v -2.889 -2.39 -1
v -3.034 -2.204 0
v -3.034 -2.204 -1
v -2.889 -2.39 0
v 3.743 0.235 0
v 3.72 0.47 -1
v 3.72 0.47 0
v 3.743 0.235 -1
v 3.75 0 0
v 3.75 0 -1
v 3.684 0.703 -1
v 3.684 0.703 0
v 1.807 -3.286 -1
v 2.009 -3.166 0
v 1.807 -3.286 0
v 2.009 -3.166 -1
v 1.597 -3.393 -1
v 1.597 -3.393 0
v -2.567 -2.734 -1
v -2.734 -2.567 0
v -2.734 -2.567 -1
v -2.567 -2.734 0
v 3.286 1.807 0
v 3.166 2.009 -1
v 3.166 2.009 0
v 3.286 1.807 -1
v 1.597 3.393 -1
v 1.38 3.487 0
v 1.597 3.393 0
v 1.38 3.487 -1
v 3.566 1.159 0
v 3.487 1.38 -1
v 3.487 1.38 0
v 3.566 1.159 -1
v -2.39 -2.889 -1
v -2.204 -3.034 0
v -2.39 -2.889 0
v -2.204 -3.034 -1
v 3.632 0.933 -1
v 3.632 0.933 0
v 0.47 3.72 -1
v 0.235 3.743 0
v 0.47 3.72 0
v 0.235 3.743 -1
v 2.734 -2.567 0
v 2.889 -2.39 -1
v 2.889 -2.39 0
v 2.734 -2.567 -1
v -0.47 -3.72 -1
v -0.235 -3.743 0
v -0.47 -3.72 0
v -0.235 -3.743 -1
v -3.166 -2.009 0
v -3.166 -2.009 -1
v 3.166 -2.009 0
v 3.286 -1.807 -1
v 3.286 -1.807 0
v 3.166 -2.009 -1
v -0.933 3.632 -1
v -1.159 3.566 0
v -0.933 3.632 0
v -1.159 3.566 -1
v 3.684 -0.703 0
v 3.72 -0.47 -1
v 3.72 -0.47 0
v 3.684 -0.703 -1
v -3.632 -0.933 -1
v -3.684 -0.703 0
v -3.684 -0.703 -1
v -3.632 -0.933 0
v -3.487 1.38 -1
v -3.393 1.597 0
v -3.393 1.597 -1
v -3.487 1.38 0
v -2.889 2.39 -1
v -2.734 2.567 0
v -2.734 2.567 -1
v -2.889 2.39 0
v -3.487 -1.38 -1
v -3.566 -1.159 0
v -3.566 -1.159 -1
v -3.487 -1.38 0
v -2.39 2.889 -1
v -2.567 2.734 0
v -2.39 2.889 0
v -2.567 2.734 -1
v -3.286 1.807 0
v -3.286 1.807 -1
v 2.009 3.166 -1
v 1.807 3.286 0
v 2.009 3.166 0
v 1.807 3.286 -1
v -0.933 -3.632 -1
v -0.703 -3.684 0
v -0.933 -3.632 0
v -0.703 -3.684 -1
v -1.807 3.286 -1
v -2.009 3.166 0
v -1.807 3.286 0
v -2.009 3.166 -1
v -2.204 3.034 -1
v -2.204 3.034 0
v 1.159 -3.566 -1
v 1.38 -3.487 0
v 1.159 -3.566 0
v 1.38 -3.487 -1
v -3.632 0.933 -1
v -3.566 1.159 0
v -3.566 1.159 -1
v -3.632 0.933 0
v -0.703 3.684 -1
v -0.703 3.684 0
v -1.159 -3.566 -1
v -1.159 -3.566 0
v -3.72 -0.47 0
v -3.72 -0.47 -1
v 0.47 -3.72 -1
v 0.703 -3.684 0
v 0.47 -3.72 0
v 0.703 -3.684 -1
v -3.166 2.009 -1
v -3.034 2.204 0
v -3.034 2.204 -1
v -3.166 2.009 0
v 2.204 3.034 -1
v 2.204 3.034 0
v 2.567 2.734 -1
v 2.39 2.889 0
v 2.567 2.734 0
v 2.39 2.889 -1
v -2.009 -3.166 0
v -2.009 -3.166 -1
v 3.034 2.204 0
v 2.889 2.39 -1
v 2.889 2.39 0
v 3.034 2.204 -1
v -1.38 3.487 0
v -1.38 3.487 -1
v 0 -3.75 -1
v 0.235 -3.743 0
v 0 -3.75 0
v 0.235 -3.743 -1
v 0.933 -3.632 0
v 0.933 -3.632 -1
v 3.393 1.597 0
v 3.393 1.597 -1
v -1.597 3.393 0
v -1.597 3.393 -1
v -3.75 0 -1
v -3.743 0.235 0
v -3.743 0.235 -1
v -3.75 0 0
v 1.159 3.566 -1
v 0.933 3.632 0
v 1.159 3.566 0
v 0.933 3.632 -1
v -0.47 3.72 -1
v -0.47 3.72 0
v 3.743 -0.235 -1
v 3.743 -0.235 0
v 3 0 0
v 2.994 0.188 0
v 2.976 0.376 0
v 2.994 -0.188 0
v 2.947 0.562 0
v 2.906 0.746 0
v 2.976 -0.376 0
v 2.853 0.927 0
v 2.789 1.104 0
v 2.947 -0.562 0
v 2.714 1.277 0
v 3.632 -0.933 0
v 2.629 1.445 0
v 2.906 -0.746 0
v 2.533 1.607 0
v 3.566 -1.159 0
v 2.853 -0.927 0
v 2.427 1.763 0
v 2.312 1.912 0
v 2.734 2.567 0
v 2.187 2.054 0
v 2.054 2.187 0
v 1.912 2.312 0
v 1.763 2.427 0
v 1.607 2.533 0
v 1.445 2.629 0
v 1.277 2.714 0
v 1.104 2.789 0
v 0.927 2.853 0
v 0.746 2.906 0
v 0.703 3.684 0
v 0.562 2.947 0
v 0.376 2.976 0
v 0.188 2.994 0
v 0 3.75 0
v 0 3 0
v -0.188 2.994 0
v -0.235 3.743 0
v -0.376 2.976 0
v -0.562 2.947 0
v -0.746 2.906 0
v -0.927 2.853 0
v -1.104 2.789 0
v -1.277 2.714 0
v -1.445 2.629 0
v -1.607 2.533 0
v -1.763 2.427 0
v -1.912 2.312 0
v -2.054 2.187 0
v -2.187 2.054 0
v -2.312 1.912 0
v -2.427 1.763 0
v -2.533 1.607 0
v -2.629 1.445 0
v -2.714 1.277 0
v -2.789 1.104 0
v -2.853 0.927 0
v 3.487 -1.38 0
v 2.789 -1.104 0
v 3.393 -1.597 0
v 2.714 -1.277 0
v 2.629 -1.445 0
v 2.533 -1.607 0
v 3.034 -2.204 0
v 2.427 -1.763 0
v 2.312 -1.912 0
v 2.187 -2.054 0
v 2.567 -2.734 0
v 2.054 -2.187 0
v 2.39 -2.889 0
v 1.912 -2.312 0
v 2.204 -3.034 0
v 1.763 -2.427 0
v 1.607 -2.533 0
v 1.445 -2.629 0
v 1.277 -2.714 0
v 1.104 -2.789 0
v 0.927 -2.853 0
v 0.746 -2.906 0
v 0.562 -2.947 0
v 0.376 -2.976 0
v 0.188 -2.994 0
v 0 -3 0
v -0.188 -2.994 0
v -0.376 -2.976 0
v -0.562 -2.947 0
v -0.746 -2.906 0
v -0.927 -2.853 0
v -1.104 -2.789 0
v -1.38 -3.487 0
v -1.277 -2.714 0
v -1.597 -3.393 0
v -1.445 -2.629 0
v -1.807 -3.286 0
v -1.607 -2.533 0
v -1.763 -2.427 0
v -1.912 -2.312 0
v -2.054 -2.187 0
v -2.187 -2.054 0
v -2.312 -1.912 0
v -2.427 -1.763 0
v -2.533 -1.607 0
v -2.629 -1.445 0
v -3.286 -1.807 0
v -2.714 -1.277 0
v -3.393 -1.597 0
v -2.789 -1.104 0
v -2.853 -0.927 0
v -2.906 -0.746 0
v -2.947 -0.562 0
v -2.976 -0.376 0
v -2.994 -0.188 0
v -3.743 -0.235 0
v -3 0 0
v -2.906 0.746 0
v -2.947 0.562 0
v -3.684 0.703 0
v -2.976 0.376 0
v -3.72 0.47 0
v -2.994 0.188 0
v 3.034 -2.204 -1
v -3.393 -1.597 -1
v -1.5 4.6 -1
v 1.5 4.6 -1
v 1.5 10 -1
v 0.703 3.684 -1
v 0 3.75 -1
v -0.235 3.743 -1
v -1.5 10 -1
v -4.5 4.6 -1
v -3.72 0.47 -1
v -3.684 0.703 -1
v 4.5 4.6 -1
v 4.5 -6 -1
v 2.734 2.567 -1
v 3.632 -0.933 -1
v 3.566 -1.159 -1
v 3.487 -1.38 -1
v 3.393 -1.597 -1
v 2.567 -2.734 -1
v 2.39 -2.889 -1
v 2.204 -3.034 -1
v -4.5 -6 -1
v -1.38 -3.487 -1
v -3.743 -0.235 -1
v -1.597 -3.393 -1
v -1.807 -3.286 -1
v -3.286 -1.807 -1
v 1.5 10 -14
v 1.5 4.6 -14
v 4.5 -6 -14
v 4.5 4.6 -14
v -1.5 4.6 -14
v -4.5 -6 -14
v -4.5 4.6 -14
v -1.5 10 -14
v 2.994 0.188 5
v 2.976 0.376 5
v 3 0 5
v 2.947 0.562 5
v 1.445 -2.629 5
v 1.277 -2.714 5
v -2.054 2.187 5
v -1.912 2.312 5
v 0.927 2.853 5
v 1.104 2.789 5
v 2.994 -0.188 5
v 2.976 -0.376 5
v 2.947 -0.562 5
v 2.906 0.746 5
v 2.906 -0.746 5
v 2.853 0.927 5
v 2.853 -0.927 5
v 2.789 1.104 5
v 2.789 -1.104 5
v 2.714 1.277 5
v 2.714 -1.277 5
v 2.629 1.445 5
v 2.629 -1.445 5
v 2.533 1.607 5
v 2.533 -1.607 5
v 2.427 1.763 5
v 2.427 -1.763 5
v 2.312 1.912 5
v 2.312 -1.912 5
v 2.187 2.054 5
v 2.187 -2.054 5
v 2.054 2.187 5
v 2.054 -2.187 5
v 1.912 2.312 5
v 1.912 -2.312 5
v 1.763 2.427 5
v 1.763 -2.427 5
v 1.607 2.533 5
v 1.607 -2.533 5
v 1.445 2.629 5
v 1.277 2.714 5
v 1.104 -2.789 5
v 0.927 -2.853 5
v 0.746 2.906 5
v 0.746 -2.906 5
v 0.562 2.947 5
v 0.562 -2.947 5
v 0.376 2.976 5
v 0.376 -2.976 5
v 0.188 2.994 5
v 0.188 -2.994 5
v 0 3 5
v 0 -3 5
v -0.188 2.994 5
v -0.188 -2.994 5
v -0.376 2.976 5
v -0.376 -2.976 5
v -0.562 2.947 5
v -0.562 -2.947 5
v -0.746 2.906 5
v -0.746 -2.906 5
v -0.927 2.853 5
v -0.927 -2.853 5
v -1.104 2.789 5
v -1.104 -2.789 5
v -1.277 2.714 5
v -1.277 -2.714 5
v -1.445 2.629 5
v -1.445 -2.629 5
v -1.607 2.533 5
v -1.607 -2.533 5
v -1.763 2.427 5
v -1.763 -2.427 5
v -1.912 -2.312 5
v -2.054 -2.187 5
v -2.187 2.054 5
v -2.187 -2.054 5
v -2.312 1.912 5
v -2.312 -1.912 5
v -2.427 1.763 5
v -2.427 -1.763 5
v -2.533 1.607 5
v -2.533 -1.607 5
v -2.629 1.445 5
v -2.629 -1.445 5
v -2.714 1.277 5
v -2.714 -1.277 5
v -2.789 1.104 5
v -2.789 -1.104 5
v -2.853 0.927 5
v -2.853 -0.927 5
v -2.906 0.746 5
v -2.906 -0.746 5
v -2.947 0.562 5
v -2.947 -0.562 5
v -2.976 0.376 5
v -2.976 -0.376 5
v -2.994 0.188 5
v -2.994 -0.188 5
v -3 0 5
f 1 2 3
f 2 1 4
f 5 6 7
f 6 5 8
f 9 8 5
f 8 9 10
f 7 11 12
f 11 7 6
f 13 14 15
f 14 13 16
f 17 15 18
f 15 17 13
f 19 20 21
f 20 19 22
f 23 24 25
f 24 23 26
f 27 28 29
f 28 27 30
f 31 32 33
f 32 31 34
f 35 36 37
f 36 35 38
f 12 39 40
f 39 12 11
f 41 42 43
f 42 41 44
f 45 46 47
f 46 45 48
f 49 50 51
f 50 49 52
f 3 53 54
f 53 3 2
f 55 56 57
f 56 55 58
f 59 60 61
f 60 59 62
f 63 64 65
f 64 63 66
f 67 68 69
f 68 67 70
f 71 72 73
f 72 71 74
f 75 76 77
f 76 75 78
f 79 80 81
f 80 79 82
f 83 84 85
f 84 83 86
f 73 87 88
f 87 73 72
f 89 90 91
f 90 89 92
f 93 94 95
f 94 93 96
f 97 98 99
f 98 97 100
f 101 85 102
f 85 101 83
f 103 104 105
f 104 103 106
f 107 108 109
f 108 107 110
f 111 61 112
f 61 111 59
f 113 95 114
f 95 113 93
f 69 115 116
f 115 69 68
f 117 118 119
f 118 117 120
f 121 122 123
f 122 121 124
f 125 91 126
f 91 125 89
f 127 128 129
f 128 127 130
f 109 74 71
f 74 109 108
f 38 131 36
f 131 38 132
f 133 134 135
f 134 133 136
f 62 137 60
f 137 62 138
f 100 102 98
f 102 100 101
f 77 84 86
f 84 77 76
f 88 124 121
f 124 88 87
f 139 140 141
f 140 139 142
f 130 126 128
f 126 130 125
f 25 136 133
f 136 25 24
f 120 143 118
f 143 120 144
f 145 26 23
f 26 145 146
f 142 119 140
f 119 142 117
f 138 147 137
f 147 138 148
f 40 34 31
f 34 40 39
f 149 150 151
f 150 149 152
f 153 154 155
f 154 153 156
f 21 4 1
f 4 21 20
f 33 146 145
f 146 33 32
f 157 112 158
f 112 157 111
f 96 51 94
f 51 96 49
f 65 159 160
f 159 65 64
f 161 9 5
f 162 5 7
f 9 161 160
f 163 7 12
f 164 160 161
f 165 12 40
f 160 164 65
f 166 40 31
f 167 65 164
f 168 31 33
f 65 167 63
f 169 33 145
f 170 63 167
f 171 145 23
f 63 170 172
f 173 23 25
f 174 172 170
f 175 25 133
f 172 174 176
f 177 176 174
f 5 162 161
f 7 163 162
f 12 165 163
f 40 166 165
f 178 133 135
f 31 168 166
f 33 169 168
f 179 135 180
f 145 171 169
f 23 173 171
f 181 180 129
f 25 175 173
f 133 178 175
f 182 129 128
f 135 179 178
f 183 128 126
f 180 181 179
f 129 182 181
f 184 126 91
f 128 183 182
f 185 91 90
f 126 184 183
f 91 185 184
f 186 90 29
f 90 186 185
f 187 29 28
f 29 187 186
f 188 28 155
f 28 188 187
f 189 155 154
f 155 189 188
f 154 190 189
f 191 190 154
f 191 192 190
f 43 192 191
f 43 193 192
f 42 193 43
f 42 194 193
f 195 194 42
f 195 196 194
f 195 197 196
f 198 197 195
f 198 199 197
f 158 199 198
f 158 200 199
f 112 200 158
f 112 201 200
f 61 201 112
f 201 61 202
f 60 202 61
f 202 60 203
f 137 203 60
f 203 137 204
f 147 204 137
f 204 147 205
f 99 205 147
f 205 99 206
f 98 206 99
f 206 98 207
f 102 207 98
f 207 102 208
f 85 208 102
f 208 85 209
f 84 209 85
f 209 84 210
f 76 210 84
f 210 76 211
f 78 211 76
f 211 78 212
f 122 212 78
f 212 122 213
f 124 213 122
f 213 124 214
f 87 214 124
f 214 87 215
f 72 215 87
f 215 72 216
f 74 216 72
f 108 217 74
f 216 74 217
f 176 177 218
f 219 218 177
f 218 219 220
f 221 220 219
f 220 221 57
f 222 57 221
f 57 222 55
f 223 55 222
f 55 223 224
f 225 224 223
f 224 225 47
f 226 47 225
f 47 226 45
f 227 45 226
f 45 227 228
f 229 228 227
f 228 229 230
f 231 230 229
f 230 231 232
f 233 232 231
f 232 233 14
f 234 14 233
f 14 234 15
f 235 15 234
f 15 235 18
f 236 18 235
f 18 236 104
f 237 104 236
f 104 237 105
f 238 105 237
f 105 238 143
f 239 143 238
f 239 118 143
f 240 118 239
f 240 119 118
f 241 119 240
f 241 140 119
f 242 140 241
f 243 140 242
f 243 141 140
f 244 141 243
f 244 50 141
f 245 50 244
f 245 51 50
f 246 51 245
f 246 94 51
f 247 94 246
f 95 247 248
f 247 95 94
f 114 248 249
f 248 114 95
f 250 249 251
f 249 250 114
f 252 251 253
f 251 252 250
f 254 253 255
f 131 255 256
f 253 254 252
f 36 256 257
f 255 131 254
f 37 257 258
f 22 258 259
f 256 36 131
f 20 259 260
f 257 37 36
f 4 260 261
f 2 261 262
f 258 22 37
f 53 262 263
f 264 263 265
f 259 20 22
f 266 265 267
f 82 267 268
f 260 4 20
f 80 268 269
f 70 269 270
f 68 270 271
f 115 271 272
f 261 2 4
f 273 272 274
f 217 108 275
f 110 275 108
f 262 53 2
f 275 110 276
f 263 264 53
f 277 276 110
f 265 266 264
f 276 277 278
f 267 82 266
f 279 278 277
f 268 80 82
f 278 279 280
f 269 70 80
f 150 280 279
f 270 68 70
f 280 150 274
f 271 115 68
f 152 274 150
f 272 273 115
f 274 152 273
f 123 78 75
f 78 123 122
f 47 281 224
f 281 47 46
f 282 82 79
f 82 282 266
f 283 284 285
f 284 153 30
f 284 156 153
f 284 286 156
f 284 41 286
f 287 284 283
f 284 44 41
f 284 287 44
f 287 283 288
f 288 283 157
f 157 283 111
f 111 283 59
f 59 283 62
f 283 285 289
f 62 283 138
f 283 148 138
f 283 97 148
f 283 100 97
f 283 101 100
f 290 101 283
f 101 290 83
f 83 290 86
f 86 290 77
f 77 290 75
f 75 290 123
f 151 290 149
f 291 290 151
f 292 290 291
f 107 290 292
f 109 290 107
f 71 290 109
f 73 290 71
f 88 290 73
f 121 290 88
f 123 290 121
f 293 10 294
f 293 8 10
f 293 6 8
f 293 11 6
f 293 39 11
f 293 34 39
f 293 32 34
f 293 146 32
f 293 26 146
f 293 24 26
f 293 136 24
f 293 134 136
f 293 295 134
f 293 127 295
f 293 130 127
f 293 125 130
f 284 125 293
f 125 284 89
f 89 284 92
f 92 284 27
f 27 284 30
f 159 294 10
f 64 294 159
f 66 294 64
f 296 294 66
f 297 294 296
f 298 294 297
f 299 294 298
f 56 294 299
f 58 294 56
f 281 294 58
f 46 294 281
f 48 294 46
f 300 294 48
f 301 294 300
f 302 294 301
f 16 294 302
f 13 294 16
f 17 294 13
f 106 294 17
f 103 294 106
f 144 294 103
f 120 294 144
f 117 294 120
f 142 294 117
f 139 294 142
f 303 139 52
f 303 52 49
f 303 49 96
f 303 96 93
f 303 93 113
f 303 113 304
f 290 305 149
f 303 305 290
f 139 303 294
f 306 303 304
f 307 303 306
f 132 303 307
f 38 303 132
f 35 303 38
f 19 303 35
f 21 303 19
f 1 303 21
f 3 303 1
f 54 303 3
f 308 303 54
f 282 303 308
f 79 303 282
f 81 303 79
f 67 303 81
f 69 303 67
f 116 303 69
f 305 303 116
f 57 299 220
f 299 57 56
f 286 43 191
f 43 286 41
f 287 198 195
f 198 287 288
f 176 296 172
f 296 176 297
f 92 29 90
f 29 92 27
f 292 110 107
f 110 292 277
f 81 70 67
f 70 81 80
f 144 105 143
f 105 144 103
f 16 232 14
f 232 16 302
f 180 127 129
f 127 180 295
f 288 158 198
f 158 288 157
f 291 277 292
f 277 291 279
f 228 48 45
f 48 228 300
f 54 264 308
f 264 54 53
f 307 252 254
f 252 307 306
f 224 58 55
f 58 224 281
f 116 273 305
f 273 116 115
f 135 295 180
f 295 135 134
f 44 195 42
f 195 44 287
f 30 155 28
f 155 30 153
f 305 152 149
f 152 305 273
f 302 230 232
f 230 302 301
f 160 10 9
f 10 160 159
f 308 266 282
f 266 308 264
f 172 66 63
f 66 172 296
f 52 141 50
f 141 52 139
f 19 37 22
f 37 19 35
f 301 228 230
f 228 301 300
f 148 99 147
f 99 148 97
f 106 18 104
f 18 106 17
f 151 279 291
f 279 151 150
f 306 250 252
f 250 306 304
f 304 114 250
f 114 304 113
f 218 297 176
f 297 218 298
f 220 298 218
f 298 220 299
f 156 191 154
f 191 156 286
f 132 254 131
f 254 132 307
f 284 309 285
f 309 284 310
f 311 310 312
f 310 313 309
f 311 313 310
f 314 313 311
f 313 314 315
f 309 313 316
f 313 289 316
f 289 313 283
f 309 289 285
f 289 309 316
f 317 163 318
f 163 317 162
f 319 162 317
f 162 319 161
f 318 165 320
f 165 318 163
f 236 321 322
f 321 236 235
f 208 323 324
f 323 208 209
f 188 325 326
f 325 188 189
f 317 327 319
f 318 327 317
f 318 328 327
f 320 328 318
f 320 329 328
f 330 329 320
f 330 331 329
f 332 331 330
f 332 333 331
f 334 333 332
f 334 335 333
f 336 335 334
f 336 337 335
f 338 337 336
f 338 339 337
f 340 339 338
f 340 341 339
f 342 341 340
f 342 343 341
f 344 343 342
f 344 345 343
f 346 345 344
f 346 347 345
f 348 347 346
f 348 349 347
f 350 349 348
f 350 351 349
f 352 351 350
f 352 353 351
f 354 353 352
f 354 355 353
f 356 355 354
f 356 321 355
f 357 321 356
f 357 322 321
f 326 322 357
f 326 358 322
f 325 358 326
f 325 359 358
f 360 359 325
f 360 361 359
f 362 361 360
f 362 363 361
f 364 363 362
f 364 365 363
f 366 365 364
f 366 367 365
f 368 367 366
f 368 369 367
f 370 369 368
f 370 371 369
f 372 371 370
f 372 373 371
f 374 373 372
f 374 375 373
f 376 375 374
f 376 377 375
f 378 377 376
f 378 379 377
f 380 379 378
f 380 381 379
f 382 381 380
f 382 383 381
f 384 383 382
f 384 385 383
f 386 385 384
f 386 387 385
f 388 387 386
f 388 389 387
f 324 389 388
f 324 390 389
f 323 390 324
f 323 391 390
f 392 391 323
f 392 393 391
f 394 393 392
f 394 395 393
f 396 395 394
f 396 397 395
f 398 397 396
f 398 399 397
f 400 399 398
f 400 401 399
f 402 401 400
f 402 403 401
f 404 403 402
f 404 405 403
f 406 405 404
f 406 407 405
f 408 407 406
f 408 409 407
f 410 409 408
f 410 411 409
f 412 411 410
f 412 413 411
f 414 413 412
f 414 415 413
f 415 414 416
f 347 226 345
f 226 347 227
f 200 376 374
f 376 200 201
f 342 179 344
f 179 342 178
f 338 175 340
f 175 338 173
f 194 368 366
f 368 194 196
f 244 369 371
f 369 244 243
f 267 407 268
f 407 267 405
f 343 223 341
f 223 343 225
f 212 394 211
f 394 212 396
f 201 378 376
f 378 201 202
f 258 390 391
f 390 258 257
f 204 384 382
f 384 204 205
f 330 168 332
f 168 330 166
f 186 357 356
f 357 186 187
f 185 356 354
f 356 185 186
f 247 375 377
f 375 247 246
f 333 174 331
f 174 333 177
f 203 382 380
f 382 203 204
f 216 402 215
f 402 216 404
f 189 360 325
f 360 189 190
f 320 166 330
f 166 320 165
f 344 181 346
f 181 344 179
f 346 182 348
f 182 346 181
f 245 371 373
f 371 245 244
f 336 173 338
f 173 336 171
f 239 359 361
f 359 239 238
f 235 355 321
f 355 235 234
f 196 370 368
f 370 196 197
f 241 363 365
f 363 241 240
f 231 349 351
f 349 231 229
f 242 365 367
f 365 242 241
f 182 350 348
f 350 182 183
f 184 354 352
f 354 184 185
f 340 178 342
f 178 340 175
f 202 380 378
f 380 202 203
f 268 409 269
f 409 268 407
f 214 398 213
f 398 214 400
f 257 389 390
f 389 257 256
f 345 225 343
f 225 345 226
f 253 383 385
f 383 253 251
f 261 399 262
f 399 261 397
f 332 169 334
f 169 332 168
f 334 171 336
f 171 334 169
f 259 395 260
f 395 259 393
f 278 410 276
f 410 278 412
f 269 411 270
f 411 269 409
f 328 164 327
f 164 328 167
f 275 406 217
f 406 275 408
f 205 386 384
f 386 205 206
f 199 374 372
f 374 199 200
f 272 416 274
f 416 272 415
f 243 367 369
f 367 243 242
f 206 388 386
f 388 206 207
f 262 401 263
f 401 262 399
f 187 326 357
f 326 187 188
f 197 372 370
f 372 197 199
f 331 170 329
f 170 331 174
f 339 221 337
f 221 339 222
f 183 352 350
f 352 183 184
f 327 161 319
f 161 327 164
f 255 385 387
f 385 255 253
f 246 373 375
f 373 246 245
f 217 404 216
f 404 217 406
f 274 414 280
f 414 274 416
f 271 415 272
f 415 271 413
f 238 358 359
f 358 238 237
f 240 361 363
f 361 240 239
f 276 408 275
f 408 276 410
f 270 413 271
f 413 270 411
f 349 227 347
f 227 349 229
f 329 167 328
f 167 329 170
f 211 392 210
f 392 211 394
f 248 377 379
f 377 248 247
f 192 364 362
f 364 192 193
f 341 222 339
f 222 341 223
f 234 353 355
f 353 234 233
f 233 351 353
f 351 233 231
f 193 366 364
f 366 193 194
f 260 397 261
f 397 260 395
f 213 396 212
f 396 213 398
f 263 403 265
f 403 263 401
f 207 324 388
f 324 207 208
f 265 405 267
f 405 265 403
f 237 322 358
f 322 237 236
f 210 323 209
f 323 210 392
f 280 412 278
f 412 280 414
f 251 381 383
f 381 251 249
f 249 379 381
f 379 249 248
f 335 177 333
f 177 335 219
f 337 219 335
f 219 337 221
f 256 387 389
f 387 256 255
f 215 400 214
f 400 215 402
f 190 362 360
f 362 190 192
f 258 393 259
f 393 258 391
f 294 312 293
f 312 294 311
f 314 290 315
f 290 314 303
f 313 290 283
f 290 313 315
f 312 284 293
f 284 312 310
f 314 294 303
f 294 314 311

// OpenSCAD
$fn=100; 

module jack_35mm(x, y, r){
    
    
    translate([0, 0, 2.5]){
        cylinder(r=3, h=5, center=true);
        
    }
    
    translate([0, 0, -0.5]) {
    
        cylinder(r=3.75, h=1, center=true);
        
        translate([-1.5, 0, -13.5]){
            cube([3, 10, 13]);
        }
    }
    
    
    translate([-4.5, -6, -14]){
        cube([9, 10.6, 13]);
    }
    

}

jack_35mm(0, 0, 0);
